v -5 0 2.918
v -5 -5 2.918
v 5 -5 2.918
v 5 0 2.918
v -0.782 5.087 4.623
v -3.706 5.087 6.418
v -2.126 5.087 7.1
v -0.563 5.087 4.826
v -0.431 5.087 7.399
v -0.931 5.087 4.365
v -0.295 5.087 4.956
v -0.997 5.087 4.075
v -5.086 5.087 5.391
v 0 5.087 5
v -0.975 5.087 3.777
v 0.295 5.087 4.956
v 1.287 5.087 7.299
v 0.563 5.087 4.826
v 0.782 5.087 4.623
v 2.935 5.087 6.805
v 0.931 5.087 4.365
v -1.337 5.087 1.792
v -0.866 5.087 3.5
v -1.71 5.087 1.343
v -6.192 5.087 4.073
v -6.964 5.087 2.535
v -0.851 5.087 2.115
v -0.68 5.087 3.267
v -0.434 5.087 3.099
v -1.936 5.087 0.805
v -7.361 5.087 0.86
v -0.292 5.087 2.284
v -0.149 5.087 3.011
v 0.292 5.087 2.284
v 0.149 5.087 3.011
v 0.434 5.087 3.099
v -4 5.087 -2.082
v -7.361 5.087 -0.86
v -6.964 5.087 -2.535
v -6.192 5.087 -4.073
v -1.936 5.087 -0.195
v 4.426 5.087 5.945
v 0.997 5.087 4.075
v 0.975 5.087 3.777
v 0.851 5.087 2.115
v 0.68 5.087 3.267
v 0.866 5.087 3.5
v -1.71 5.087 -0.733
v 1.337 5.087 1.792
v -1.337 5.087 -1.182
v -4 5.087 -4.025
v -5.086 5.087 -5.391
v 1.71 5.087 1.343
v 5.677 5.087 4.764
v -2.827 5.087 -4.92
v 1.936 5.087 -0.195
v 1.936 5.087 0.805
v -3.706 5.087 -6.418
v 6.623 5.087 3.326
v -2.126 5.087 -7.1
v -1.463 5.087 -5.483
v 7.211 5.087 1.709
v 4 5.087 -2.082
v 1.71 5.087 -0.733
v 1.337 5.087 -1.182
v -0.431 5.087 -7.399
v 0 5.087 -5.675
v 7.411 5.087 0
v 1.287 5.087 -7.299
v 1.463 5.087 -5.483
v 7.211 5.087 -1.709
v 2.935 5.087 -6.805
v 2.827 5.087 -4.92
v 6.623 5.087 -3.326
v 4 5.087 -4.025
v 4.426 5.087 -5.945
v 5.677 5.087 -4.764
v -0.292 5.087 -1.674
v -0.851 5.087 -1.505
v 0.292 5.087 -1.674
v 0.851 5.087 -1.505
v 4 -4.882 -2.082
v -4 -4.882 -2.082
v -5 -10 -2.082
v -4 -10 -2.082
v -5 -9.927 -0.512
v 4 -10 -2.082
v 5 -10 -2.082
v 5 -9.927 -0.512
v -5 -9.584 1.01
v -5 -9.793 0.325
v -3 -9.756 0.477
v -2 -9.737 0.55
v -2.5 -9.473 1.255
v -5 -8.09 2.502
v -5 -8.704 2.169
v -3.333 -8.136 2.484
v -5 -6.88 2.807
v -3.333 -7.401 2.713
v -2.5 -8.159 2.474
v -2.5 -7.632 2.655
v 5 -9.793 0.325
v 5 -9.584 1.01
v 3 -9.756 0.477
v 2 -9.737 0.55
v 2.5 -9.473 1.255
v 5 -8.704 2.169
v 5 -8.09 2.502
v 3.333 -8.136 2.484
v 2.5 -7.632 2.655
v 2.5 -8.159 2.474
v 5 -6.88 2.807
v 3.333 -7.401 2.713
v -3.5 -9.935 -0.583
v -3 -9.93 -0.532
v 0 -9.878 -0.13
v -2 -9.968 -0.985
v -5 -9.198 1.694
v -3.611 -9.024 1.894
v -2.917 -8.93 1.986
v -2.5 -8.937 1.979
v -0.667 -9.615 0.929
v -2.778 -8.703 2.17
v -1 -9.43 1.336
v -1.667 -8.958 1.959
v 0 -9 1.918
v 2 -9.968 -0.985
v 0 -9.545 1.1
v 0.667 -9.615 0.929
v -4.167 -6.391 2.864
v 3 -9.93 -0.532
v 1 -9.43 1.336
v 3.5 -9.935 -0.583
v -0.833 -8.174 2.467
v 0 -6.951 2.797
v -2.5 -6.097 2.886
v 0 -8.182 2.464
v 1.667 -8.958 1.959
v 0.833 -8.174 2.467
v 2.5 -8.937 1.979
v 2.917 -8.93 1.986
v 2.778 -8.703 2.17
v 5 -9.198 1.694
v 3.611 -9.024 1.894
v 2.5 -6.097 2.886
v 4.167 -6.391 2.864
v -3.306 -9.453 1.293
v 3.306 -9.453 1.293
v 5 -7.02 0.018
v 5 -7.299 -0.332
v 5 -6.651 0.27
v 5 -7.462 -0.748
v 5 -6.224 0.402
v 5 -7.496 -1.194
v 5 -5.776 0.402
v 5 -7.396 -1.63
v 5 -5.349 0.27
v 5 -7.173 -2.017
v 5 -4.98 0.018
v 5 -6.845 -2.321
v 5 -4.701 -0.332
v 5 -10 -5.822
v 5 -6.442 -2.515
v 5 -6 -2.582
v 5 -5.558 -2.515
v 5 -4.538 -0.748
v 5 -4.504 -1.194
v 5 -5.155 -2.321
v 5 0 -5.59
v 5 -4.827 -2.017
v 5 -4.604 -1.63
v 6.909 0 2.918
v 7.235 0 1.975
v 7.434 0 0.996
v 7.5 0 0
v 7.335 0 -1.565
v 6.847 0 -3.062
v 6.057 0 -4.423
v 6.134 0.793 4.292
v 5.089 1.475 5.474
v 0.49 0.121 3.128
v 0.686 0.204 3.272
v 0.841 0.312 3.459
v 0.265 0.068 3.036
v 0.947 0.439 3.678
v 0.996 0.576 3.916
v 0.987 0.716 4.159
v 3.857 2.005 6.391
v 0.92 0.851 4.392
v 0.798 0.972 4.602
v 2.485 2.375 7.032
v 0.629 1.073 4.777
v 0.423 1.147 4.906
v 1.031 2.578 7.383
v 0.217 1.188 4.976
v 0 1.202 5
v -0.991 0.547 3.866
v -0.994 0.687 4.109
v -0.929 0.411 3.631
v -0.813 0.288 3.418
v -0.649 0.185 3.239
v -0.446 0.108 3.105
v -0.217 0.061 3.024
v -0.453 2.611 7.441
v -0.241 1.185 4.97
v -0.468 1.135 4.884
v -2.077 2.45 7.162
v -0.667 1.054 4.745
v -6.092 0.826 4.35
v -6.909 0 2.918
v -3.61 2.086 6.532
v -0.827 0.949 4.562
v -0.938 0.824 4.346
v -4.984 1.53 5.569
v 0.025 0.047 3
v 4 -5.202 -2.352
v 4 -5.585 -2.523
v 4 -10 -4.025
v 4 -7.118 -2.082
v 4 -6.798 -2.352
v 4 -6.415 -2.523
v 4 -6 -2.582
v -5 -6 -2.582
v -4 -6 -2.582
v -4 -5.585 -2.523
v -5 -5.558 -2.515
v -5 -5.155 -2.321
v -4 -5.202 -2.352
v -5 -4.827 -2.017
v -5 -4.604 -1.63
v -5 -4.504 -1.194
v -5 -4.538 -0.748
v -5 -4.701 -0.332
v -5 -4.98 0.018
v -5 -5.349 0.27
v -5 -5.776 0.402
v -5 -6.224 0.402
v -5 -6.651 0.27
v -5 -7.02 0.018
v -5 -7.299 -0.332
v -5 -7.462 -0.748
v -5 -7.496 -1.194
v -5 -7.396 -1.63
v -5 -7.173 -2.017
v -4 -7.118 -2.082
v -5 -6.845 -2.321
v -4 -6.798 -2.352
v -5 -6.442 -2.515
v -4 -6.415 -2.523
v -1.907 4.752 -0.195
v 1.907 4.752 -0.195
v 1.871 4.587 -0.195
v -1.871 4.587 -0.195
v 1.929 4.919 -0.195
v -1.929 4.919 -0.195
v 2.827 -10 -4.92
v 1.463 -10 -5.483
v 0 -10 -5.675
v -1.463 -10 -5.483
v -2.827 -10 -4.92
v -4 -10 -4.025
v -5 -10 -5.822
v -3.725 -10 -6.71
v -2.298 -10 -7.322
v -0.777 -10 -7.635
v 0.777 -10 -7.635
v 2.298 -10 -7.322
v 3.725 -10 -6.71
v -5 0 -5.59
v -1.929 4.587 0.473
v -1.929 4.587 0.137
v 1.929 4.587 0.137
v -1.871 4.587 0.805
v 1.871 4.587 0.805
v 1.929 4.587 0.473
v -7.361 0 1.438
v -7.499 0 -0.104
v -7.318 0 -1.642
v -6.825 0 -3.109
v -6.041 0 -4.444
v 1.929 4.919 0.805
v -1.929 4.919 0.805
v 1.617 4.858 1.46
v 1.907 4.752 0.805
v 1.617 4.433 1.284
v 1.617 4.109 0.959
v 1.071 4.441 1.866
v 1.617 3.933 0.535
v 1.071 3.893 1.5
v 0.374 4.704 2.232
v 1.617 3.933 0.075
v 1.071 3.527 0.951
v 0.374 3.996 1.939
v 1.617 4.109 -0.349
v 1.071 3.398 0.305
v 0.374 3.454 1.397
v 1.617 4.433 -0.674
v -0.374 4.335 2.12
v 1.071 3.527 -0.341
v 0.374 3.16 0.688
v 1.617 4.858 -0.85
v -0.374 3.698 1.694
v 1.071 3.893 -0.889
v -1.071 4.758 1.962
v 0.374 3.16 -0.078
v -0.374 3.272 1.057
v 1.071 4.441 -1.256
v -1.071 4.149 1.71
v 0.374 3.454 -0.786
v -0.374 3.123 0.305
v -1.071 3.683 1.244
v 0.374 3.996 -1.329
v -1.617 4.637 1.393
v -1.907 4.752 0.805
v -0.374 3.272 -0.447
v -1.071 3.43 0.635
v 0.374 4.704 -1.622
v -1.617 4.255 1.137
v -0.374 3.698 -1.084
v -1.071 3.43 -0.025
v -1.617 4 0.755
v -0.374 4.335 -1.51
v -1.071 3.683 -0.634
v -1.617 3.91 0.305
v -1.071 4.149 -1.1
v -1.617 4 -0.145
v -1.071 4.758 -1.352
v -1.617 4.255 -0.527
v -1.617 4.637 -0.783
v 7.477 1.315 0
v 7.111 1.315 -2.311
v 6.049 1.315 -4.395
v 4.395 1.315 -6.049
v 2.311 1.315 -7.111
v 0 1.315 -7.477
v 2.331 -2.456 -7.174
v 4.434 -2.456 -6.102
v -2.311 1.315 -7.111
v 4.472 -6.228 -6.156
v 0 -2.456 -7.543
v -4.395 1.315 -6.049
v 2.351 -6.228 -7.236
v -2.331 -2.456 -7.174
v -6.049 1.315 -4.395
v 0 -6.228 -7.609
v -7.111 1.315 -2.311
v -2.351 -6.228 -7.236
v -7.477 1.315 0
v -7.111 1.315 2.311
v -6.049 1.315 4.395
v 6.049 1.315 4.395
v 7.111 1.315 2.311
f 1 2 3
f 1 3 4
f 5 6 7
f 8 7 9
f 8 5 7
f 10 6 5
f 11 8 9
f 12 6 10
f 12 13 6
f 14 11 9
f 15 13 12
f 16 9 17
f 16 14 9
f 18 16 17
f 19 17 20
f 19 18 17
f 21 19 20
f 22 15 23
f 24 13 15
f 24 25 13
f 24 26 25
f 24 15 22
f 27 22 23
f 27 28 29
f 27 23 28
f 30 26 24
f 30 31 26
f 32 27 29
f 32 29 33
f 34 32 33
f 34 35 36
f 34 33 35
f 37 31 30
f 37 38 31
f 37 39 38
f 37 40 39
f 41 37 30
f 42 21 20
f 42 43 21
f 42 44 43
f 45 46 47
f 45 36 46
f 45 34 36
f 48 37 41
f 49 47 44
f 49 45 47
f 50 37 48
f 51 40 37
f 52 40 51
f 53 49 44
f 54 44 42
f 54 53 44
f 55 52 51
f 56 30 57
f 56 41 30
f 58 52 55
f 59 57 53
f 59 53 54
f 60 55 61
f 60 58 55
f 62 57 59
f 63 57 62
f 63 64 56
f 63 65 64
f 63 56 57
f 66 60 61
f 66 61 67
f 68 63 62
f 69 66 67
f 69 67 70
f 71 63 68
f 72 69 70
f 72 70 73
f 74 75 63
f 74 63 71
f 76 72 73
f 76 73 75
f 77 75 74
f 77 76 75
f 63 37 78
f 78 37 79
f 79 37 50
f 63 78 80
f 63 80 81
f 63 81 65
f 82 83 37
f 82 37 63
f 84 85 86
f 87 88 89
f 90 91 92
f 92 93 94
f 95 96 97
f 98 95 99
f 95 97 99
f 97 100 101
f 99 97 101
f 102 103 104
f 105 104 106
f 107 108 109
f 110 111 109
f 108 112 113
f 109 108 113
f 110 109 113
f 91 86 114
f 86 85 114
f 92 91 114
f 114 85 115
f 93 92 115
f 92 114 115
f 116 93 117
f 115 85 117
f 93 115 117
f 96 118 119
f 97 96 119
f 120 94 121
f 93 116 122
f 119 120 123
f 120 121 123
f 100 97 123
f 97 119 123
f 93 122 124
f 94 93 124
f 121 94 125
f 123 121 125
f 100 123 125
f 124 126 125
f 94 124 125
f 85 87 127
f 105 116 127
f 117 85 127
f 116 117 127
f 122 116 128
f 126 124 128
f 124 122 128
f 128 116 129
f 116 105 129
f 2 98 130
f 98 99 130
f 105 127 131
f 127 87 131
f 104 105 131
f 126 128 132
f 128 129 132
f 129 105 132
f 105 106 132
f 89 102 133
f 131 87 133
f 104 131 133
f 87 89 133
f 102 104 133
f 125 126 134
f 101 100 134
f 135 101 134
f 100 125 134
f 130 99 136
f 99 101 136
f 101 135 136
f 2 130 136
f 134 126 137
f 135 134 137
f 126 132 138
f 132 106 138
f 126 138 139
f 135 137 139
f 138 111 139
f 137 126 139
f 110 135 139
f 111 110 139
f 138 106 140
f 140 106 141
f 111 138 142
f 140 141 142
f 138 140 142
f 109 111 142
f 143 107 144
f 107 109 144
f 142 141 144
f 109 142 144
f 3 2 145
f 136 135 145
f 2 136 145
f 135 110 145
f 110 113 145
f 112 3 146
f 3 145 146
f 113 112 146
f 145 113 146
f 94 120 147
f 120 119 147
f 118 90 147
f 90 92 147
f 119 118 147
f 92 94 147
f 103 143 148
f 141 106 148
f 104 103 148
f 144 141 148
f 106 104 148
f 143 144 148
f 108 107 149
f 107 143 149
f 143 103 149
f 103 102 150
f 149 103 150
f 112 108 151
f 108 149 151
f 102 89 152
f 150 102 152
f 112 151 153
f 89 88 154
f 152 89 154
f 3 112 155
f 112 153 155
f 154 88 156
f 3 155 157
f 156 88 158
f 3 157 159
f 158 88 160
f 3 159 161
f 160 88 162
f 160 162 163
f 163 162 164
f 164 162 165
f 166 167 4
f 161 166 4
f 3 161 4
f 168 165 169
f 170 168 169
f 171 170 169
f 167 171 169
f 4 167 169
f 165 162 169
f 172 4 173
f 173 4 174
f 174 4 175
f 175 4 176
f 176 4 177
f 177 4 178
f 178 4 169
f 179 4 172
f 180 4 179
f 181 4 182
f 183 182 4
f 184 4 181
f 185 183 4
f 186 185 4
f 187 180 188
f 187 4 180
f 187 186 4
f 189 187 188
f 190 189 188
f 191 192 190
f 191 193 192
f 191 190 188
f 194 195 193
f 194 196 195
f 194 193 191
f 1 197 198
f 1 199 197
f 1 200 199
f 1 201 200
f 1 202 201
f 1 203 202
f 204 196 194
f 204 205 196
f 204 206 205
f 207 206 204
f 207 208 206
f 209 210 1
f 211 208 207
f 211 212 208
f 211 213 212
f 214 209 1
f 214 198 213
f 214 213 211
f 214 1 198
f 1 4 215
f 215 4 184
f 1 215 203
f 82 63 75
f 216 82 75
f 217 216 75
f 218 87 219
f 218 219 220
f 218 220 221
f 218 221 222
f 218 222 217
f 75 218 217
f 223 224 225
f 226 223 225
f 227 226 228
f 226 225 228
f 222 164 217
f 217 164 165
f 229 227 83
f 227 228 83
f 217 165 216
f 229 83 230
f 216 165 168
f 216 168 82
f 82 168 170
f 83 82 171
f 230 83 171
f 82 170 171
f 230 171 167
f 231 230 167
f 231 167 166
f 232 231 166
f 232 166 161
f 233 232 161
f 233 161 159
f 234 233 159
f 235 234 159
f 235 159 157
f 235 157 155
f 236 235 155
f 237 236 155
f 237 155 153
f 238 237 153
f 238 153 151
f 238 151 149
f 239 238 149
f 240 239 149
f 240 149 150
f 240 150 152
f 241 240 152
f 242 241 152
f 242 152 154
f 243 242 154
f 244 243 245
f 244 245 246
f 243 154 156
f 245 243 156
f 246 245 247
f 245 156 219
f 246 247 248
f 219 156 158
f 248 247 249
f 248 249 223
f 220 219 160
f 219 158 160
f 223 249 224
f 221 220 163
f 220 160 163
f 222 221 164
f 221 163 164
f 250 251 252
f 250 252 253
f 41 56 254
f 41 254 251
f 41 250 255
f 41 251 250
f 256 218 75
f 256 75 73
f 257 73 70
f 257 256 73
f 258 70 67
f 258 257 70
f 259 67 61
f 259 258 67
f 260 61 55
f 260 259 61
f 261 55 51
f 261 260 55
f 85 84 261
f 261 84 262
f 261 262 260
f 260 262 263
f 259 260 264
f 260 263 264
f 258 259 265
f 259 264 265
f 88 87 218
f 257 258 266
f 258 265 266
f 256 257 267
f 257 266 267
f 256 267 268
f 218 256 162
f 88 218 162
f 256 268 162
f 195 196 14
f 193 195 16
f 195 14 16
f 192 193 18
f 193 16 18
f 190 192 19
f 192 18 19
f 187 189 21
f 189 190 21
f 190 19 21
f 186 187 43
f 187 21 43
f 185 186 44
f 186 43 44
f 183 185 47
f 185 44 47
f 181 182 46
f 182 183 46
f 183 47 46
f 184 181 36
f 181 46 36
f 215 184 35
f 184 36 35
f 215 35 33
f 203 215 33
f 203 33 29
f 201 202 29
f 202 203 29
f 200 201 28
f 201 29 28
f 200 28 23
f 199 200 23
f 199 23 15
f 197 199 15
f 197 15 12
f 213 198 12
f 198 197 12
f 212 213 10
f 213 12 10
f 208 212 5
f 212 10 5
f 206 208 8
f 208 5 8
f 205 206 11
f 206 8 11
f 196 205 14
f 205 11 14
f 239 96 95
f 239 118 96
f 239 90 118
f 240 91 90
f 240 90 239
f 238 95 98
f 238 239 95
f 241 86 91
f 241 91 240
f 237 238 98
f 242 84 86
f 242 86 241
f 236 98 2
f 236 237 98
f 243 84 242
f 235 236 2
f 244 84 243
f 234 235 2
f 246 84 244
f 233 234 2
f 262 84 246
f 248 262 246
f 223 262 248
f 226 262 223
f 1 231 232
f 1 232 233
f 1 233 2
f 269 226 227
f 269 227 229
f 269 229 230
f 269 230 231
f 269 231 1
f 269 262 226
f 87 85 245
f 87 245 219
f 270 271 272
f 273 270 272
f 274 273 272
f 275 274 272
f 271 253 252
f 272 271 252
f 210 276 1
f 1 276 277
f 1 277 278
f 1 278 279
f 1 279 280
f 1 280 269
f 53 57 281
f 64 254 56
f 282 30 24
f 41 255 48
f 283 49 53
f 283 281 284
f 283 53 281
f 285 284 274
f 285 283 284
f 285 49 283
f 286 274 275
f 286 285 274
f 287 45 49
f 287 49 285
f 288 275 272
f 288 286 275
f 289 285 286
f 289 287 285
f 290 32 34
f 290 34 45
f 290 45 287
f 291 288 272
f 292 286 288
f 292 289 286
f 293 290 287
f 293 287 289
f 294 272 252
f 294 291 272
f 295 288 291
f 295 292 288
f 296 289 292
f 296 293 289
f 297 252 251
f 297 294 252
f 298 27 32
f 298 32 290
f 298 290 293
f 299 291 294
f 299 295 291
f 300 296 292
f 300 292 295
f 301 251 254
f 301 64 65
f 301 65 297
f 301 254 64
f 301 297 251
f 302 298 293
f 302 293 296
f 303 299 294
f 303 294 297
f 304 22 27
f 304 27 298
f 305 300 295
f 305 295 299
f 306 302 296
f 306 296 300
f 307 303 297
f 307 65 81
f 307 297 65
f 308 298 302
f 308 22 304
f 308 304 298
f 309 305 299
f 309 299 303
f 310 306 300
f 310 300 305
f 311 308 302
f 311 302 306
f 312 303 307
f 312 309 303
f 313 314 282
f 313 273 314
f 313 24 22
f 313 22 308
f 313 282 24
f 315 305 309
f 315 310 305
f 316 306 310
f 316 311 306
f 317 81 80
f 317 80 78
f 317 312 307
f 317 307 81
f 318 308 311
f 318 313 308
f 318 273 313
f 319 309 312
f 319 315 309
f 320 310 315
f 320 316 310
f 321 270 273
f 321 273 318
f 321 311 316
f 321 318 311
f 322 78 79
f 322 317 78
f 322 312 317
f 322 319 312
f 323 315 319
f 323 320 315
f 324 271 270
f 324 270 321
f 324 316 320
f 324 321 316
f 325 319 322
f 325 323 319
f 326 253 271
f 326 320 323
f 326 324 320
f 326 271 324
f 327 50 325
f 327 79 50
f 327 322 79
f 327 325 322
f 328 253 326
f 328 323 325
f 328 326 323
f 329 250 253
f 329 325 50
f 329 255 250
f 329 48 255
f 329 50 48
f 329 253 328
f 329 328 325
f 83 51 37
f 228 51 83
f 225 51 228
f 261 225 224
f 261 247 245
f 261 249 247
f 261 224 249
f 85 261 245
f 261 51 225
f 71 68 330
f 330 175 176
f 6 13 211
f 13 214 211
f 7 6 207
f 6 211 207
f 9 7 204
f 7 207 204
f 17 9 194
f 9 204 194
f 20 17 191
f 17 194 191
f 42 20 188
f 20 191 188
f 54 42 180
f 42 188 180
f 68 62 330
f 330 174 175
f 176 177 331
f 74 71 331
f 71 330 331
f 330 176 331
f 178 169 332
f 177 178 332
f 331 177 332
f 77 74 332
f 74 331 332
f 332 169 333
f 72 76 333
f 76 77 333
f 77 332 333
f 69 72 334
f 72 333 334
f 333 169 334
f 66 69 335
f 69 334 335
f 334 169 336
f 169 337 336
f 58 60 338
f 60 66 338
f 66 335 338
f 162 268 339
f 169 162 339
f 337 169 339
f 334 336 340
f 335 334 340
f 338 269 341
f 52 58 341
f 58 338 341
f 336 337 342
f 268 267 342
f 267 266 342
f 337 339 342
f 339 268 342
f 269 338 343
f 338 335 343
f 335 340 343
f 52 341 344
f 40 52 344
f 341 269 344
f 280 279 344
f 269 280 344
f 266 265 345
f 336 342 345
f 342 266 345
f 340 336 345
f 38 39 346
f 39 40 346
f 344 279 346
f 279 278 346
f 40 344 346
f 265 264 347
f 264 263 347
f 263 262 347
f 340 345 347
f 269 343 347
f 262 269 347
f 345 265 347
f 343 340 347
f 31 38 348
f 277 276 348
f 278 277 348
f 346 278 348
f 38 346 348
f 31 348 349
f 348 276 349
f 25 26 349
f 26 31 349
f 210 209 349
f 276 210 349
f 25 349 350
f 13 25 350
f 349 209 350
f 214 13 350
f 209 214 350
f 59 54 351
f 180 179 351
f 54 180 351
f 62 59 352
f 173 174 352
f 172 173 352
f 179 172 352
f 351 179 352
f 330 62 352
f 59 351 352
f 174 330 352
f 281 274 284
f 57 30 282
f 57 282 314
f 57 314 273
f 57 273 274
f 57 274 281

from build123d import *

# Parameters (mm, degrees)
SKETCH1_R                     = 7.5
BOSS_EXTRUDE1_DEPTH           = 15
BOSS_EXTRUDE1_TAPER           = 1
BOSS_EXTRUDE1_OTHER_WAY_DEPTH = 10
BOSS_EXTRUDE1_OTHER_WAY_TAPER = -1
CUT_EXTRUDE1_DEPTH            = 19.514790178
CUT_EXTRUDE1_DEPTH_BACK       = 19.514790178
CUT_EXTRUDE2_START            = -10.593003294
CUT_EXTRUDE2_OUTLINE_W        = 6.502745185
CUT_EXTRUDE2_OUTLINE_H        = 10
CUT_EXTRUDE2_DEPTH            = 10.593003294
SKETCH5_R                     = 1.5
CUT_EXTRUDE3_DEPTH            = 21.979721988
FILLET1_SIZE                  = 5
CUT_EXTRUDE4_DEPTH            = 19.443121582
CUT_EXTRUDE4_DEPTH_BACK       = 19.443121582
SKETCH6_W                     = 21.270993481
SKETCH6_H                     = 9.912737968
CUT_EXTRUDE5_DEPTH            = 19.514162399
SKETCH8_R                     = 1
CUT_EXTRUDE6_DEPTH            = 19.514162399
BOSS_EXTRUDE2_DEPTH           = 0.5


with BuildPart() as part:
    # Sketch1 → Boss-Extrude1 (new body)
    with BuildSketch(Plane(origin=(0, 0, 0), x_dir=(1, 0, 0), z_dir=(0, 1, 0))):
        Circle(SKETCH1_R)
    extrude(amount=BOSS_EXTRUDE1_DEPTH, taper=BOSS_EXTRUDE1_TAPER)

    # Sketch1 → Boss-Extrude1 other way (add)
    with BuildSketch(Plane(origin=(0, 0, 0), x_dir=(1, 0, 0), z_dir=(0, 1, 0))):
        Circle(SKETCH1_R)
    extrude(amount=-BOSS_EXTRUDE1_OTHER_WAY_DEPTH, taper=BOSS_EXTRUDE1_OTHER_WAY_TAPER)

    # Sketch3 → Cut-Extrude1 (cut, two sides: drawn at the far end of the back side and taken through both)
    with BuildSketch(Plane(origin=(0, 0, 0), x_dir=(0, 0, -1), z_dir=(1, 0, 0)).offset(-CUT_EXTRUDE1_DEPTH_BACK)):
        Polygon((-2.918452544, -10), (-2.918452544, 0), (-14.964340612, 6.954696718), (-14.964340612, -10), align=None)
    extrude(amount=CUT_EXTRUDE1_DEPTH + CUT_EXTRUDE1_DEPTH_BACK, mode=Mode.SUBTRACT)

    # Cut-Extrude2: read off the stored shape, not the designer's step
    # Cut-Extrude2 outline → Cut-Extrude2 (cut)
    with BuildSketch(Plane.XY.offset(2.918452544).offset(CUT_EXTRUDE2_START)):
        with Locations((-8.251372593, -5)):
            Rectangle(CUT_EXTRUDE2_OUTLINE_W, CUT_EXTRUDE2_OUTLINE_H)
        with Locations((8.251372593, -5)):
            Rectangle(CUT_EXTRUDE2_OUTLINE_W, CUT_EXTRUDE2_OUTLINE_H)
    extrude(amount=CUT_EXTRUDE2_DEPTH, mode=Mode.SUBTRACT)

    # Sketch5 → Cut-Extrude3 (cut, through all)
    with BuildSketch(Plane(origin=(5, 0, 0), x_dir=(0, 0, -1), z_dir=(1, 0, 0))):
        with Locations((1.081547456, -6)):
            Circle(SKETCH5_R)
    extrude(amount=-CUT_EXTRUDE3_DEPTH, mode=Mode.SUBTRACT)

    # Fillet1
    # a fillet whose section is not a circle: 5 mm, written as the material it takes off along each edge
    with BuildSketch(Plane(origin=(17.5, -10, 2.918452544), x_dir=(0, 0, -1), z_dir=(-1, 0, 0))) as fillet1_piece_1:
        with BuildLine():
            Bezier((FILLET1_SIZE, 0), (0, 0), (0, -FILLET1_SIZE), weights=[1, 1.5, 1])
            Line((0, -FILLET1_SIZE), (0, 0))
            Line((0, 0), (FILLET1_SIZE, 0))
        make_face()
    extrude(amount=35, mode=Mode.SUBTRACT)

    # Fillet2
    # a fillet whose section is not a circle: 10, 5 mm, written as the material it takes off along each edge
    with BuildSketch(Plane(origin=(0, 15, 0), x_dir=(1, 0, 0), z_dir=(0, 0, -1))) as fillet2_piece_1:
        with BuildLine():
            Bezier((7.411201511, 9.912737968), (7.238174026, 0), (2.411963035, 0), weights=[1, 0.818181818, 1])
            Line((2.411963035, 0), (7.238174026, 0))
            Line((7.238174026, 0), (7.411201511, 9.912737968))
        make_face()
    revolve(axis=Axis((0, 15, 0), (0, -1, 0)), mode=Mode.SUBTRACT)

    # Sketch6 → Cut-Extrude4 (cut, two sides: drawn at the far end of the back side and taken through both)
    with BuildSketch(Plane(origin=(0, 0, 0), x_dir=(0, 0, -1), z_dir=(1, 0, 0)).offset(-CUT_EXTRUDE4_DEPTH_BACK)):
        with Locations((-1.160829525, 10.043631016)):
            Rectangle(SKETCH6_W, SKETCH6_H)
    extrude(amount=CUT_EXTRUDE4_DEPTH + CUT_EXTRUDE4_DEPTH_BACK, mode=Mode.SUBTRACT)

    # Sketch7 → Cut-Extrude5 (cut, through all)
    with BuildSketch(Plane.XZ.offset(10)):
        with BuildLine():
            Line((4, -2.081547456), (4, -4.024987586))
            ThreePointArc((4, -4.024987586), (0, -5.674550649), (-4, -4.024987586))
            Line((-4, -4.024987586), (-4, -2.081547456))
            Line((-4, -2.081547456), (4, -2.081547456))
        make_face()
    extrude(amount=-CUT_EXTRUDE5_DEPTH, mode=Mode.SUBTRACT)

    # Sketch8 → Cut-Extrude6 (cut, through all)
    with BuildSketch(Plane(origin=(0, 5.087262032, 0), x_dir=(1, 0, 0), z_dir=(0, 1, 0))):
        with Locations(Location((0, -4, 0), (0, 0, 270))):
            Circle(SKETCH8_R)
    extrude(amount=-CUT_EXTRUDE6_DEPTH, mode=Mode.SUBTRACT)

    # Sketch9 → Cut-Revolve3 (revolve, cut)
    with BuildSketch(Plane(origin=(0, 5.087262032, 0), x_dir=(1, 0, 0), z_dir=(0, 1, 0))):
        with BuildLine():
            Line((-2, -0.30500636), (2, -0.30500636))
            ThreePointArc((2, -0.30500636), (0, 1.69499364), (-2, -0.30500636))
        make_face()
    revolve(axis=Axis((-2, 5.087262032, 0.30500636), (1, 0, 0)), mode=Mode.SUBTRACT)

    # Sketch10 → Boss-Extrude2 (add)
    with BuildSketch(Plane(origin=(0, 5.087262032, 0), x_dir=(1, 0, 0), z_dir=(0, 1, 0))):
        with BuildLine():
            Line((-1.936491673, -0.80500636), (1.936491673, -0.80500636))
            ThreePointArc((1.936491673, -0.80500636), (2, -0.30500636), (1.936491673, 0.19499364))
            Line((1.936491673, 0.19499364), (-1.936491673, 0.19499364))
            ThreePointArc((-1.936491673, 0.19499364), (-2, -0.30500636), (-1.936491673, -0.80500636))
        make_face()
    extrude(amount=-BOSS_EXTRUDE2_DEPTH)


solid = part.part
